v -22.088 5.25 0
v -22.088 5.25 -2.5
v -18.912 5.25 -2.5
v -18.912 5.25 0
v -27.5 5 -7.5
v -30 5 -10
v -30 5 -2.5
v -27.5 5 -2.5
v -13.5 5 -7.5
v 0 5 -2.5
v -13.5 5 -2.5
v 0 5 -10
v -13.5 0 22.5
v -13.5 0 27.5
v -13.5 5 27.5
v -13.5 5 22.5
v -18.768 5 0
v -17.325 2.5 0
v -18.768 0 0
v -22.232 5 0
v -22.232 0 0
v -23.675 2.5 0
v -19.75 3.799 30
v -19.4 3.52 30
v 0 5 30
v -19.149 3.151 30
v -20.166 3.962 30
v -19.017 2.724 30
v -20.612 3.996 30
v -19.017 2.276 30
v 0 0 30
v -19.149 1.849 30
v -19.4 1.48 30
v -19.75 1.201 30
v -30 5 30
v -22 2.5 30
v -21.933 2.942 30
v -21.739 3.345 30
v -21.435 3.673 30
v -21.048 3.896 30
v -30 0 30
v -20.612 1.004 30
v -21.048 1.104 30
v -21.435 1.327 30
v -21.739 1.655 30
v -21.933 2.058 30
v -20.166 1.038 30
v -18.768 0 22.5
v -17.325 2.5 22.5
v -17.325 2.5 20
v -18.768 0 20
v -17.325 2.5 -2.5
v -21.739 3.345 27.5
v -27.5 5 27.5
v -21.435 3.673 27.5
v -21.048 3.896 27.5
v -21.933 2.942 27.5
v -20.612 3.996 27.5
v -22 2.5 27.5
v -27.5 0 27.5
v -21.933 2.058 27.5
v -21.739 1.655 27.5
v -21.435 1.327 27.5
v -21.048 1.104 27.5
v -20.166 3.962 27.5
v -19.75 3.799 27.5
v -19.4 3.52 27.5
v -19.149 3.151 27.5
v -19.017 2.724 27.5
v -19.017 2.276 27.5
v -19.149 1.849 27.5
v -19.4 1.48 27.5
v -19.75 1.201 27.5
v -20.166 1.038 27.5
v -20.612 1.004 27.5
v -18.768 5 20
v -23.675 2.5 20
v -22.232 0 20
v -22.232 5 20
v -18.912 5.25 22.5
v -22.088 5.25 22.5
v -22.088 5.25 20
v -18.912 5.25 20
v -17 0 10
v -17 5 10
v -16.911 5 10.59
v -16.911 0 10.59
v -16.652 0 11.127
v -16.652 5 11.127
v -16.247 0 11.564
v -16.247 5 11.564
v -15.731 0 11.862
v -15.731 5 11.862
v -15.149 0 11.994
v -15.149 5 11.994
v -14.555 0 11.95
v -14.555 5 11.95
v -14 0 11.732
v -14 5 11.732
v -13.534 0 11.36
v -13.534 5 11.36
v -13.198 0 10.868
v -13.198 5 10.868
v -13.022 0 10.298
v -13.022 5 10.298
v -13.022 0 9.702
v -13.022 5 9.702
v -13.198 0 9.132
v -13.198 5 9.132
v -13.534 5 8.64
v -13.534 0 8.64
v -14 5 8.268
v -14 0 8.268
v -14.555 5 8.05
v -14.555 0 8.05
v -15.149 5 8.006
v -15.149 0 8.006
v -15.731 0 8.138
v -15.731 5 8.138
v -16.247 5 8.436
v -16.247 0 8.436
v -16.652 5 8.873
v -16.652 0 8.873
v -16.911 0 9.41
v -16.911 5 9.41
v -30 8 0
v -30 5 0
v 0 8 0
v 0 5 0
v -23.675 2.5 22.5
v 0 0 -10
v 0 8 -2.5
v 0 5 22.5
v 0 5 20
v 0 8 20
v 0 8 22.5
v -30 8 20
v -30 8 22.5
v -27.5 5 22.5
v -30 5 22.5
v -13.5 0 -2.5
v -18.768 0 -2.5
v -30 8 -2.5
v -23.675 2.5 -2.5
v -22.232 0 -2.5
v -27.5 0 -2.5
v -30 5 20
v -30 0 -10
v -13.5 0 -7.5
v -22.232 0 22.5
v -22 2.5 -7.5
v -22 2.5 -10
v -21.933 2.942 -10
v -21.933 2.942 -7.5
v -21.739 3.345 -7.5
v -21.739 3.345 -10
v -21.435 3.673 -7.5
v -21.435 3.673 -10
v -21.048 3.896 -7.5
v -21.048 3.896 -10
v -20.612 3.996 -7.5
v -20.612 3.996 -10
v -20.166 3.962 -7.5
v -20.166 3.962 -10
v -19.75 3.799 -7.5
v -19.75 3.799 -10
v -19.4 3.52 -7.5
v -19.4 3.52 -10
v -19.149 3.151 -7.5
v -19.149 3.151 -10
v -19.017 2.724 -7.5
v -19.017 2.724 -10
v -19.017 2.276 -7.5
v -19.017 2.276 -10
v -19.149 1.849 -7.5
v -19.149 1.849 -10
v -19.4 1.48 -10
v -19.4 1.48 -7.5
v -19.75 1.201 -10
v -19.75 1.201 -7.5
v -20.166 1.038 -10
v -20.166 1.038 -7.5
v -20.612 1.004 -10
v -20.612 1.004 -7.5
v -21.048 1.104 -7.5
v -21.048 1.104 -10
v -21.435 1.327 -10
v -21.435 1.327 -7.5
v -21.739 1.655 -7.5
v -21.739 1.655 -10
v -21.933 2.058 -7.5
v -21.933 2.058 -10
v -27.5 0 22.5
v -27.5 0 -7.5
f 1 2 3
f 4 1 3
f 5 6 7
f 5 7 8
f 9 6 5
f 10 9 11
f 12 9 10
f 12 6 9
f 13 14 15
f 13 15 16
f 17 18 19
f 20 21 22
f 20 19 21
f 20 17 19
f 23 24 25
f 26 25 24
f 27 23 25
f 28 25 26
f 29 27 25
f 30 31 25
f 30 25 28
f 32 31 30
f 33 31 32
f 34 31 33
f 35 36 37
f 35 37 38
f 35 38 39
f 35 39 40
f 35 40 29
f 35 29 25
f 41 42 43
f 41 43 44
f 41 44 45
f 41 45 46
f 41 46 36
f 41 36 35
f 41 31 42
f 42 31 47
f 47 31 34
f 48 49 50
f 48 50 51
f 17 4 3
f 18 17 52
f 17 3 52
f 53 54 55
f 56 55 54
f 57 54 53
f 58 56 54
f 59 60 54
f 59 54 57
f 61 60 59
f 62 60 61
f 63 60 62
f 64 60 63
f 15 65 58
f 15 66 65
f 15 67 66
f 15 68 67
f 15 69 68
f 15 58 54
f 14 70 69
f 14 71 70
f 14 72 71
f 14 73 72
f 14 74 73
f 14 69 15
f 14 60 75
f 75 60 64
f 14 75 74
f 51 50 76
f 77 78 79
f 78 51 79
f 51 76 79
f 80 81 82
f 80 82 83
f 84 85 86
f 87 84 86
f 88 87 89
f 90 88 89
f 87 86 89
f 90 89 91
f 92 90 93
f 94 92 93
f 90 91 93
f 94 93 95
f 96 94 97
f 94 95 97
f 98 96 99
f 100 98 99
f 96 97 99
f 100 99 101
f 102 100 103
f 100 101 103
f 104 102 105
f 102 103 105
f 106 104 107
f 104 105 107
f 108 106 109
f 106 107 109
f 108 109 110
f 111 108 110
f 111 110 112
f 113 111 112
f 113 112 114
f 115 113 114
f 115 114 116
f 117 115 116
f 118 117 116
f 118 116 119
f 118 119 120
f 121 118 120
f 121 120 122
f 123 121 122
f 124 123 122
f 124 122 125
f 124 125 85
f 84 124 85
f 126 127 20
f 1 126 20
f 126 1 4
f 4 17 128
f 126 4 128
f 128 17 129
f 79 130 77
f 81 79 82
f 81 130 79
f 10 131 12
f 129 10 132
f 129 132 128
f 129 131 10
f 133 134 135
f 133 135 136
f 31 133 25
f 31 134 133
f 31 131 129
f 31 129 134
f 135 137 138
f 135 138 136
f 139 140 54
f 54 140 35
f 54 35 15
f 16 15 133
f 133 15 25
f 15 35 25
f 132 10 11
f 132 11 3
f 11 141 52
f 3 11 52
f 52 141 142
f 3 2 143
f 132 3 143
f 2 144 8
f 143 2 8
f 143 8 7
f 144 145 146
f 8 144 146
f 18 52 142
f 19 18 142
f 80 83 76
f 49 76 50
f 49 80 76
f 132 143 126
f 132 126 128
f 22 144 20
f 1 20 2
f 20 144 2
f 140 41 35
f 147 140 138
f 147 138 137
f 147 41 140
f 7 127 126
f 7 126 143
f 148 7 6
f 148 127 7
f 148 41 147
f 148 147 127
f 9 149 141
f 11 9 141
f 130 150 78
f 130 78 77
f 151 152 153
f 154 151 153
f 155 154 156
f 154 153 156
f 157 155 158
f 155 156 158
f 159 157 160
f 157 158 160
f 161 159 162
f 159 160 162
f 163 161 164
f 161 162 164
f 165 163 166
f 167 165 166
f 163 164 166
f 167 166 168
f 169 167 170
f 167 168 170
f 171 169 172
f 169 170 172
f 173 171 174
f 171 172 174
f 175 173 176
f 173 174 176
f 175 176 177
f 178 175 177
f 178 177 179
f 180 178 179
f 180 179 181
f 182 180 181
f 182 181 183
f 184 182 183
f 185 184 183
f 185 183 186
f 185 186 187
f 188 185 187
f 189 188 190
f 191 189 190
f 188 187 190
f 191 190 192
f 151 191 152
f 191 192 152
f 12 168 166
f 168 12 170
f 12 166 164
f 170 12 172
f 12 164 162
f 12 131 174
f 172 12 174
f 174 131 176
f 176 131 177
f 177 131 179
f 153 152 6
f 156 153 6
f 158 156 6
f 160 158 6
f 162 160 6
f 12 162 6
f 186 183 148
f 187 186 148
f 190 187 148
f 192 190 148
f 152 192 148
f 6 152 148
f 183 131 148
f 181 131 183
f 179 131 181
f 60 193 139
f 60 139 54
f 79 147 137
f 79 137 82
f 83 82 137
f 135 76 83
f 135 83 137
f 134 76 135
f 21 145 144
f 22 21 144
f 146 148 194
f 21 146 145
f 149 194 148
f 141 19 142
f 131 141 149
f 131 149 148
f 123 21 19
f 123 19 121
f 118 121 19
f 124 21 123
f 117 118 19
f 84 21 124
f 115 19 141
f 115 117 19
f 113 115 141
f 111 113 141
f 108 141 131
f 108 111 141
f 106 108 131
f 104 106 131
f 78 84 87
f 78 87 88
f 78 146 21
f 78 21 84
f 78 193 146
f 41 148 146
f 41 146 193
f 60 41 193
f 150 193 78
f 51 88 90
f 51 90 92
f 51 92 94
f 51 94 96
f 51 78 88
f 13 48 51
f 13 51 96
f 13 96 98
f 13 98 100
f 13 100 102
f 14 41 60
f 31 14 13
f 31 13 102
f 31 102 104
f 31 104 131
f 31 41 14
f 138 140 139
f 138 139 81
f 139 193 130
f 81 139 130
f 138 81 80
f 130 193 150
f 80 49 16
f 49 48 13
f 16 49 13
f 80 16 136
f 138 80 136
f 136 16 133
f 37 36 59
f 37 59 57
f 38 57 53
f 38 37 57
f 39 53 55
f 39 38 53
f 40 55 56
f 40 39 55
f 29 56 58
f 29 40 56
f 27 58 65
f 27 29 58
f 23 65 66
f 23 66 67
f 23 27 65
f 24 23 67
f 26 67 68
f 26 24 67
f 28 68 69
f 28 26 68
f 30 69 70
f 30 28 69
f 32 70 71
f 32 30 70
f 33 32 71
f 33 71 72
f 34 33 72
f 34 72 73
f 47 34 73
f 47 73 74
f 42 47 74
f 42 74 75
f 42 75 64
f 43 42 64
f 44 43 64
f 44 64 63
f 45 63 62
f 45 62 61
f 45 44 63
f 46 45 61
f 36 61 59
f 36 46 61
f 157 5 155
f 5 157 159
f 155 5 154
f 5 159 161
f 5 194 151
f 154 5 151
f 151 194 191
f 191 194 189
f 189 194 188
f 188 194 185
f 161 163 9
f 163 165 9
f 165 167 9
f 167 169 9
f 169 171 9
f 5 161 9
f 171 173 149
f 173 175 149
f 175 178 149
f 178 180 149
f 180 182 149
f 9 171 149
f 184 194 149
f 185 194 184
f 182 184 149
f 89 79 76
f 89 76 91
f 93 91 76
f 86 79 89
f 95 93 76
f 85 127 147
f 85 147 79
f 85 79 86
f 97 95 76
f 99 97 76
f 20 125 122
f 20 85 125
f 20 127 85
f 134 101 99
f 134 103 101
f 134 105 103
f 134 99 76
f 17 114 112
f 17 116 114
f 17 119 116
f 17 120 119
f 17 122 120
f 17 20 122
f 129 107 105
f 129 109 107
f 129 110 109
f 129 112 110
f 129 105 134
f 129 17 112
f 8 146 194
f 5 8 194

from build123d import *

# Parameters (mm, degrees)
SKETCH1_W           = 30
SKETCH1_H           = 32.5
SKETCH1_W_2         = 14
SKETCH1_H_2         = 5
BOSS_EXTRUDE1_DEPTH = 5
SKETCH1_3_W         = 30
SKETCH1_3_H         = 2.5
BOSS_EXTRUDE2_DEPTH = 8
SKETCH3_R           = 1.5
CUT_EXTRUDE2_DEPTH  = 2.5
CUT_EXTRUDE3_DEPTH  = 2.5
SKETCH2_R           = 2
CUT_EXTRUDE1_DEPTH  = 43.720018727
CUT_EXTRUDE4_DEPTH  = 2.5


with BuildPart() as part:
    # Sketch1 → Boss-Extrude1 (new body)
    with BuildSketch(Plane(origin=(0, 0, 0), x_dir=(1, 0, 0), z_dir=(0, 1, 0))):
        with Locations((-15, -6.25)):
            Rectangle(SKETCH1_W, SKETCH1_H)
        with Locations((-20.5, 5)):
            Rectangle(SKETCH1_W_2, SKETCH1_H_2, mode=Mode.SUBTRACT)
    boss_extrude1 = extrude(amount=BOSS_EXTRUDE1_DEPTH)

    # Sketch1<3> → Boss-Extrude2 (add)
    with BuildSketch(Plane(origin=(0, 0, 0), x_dir=(1, 0, 0), z_dir=(0, 1, 0))):
        with Locations((-15, -21.25)):
            Rectangle(SKETCH1_3_W, SKETCH1_3_H)
        with Locations((-15, 1.25)):
            Rectangle(SKETCH1_3_W, SKETCH1_3_H)
    extrude(amount=BOSS_EXTRUDE2_DEPTH)

    # Sketch3 → Cut-Extrude2 (cut)
    with BuildSketch(Plane(origin=(0, 0, -10), x_dir=(-1, 0, 0), z_dir=(0, 0, -1))):
        with Locations((20.5, 2.5)):
            Circle(SKETCH3_R)
    cut_extrude2 = extrude(amount=-CUT_EXTRUDE2_DEPTH, mode=Mode.SUBTRACT)

    # Sketch4 → Cut-Extrude3 (cut)
    with BuildSketch(Plane(origin=(0, 0, -2.5), x_dir=(-1, 0, 0), z_dir=(0, 0, -1))):
        Polygon((22.08771324, -0.25), (23.675426481, 2.5), (22.08771324, 5.25), (18.91228676, 5.25), (17.324573519, 2.5), (18.91228676, -0.25), align=None)
    cut_extrude3 = extrude(amount=-CUT_EXTRUDE3_DEPTH, mode=Mode.SUBTRACT)

    # Mirror1: Boss-Extrude1, Cut-Extrude2, Cut-Extrude3 across plane
    add(boss_extrude1.mirror(Plane(origin=(0, 0, 10), x_dir=(1, 0, 0), z_dir=(0, 0, -1))))
    add(cut_extrude2.mirror(Plane(origin=(0, 0, 10), x_dir=(1, 0, 0), z_dir=(0, 0, -1))), mode=Mode.SUBTRACT)
    add(cut_extrude3.mirror(Plane(origin=(0, 0, 10), x_dir=(1, 0, 0), z_dir=(0, 0, -1))), mode=Mode.SUBTRACT)

    # Sketch2 → Cut-Extrude1 (cut, through all)
    with BuildSketch(Plane(origin=(0, 5, 0), x_dir=(1, 0, 0), z_dir=(0, 1, 0))):
        with Locations((-15, -10)):
            Circle(SKETCH2_R)
    extrude(amount=-CUT_EXTRUDE1_DEPTH, mode=Mode.SUBTRACT)

    # Sketch4<3> → Cut-Extrude4 (cut)
    with BuildSketch(Plane(origin=(0, 0, -2.5), x_dir=(-1, 0, 0), z_dir=(0, 0, -1))):
        Polygon((22.232050808, 0), (23.675426481, 2.5), (22.08771324, 5.25), (18.91228676, 5.25), (17.324573519, 2.5), (18.767949192, 0), align=None)
    extrude(amount=-CUT_EXTRUDE4_DEPTH, mode=Mode.SUBTRACT)


solid = part.part
